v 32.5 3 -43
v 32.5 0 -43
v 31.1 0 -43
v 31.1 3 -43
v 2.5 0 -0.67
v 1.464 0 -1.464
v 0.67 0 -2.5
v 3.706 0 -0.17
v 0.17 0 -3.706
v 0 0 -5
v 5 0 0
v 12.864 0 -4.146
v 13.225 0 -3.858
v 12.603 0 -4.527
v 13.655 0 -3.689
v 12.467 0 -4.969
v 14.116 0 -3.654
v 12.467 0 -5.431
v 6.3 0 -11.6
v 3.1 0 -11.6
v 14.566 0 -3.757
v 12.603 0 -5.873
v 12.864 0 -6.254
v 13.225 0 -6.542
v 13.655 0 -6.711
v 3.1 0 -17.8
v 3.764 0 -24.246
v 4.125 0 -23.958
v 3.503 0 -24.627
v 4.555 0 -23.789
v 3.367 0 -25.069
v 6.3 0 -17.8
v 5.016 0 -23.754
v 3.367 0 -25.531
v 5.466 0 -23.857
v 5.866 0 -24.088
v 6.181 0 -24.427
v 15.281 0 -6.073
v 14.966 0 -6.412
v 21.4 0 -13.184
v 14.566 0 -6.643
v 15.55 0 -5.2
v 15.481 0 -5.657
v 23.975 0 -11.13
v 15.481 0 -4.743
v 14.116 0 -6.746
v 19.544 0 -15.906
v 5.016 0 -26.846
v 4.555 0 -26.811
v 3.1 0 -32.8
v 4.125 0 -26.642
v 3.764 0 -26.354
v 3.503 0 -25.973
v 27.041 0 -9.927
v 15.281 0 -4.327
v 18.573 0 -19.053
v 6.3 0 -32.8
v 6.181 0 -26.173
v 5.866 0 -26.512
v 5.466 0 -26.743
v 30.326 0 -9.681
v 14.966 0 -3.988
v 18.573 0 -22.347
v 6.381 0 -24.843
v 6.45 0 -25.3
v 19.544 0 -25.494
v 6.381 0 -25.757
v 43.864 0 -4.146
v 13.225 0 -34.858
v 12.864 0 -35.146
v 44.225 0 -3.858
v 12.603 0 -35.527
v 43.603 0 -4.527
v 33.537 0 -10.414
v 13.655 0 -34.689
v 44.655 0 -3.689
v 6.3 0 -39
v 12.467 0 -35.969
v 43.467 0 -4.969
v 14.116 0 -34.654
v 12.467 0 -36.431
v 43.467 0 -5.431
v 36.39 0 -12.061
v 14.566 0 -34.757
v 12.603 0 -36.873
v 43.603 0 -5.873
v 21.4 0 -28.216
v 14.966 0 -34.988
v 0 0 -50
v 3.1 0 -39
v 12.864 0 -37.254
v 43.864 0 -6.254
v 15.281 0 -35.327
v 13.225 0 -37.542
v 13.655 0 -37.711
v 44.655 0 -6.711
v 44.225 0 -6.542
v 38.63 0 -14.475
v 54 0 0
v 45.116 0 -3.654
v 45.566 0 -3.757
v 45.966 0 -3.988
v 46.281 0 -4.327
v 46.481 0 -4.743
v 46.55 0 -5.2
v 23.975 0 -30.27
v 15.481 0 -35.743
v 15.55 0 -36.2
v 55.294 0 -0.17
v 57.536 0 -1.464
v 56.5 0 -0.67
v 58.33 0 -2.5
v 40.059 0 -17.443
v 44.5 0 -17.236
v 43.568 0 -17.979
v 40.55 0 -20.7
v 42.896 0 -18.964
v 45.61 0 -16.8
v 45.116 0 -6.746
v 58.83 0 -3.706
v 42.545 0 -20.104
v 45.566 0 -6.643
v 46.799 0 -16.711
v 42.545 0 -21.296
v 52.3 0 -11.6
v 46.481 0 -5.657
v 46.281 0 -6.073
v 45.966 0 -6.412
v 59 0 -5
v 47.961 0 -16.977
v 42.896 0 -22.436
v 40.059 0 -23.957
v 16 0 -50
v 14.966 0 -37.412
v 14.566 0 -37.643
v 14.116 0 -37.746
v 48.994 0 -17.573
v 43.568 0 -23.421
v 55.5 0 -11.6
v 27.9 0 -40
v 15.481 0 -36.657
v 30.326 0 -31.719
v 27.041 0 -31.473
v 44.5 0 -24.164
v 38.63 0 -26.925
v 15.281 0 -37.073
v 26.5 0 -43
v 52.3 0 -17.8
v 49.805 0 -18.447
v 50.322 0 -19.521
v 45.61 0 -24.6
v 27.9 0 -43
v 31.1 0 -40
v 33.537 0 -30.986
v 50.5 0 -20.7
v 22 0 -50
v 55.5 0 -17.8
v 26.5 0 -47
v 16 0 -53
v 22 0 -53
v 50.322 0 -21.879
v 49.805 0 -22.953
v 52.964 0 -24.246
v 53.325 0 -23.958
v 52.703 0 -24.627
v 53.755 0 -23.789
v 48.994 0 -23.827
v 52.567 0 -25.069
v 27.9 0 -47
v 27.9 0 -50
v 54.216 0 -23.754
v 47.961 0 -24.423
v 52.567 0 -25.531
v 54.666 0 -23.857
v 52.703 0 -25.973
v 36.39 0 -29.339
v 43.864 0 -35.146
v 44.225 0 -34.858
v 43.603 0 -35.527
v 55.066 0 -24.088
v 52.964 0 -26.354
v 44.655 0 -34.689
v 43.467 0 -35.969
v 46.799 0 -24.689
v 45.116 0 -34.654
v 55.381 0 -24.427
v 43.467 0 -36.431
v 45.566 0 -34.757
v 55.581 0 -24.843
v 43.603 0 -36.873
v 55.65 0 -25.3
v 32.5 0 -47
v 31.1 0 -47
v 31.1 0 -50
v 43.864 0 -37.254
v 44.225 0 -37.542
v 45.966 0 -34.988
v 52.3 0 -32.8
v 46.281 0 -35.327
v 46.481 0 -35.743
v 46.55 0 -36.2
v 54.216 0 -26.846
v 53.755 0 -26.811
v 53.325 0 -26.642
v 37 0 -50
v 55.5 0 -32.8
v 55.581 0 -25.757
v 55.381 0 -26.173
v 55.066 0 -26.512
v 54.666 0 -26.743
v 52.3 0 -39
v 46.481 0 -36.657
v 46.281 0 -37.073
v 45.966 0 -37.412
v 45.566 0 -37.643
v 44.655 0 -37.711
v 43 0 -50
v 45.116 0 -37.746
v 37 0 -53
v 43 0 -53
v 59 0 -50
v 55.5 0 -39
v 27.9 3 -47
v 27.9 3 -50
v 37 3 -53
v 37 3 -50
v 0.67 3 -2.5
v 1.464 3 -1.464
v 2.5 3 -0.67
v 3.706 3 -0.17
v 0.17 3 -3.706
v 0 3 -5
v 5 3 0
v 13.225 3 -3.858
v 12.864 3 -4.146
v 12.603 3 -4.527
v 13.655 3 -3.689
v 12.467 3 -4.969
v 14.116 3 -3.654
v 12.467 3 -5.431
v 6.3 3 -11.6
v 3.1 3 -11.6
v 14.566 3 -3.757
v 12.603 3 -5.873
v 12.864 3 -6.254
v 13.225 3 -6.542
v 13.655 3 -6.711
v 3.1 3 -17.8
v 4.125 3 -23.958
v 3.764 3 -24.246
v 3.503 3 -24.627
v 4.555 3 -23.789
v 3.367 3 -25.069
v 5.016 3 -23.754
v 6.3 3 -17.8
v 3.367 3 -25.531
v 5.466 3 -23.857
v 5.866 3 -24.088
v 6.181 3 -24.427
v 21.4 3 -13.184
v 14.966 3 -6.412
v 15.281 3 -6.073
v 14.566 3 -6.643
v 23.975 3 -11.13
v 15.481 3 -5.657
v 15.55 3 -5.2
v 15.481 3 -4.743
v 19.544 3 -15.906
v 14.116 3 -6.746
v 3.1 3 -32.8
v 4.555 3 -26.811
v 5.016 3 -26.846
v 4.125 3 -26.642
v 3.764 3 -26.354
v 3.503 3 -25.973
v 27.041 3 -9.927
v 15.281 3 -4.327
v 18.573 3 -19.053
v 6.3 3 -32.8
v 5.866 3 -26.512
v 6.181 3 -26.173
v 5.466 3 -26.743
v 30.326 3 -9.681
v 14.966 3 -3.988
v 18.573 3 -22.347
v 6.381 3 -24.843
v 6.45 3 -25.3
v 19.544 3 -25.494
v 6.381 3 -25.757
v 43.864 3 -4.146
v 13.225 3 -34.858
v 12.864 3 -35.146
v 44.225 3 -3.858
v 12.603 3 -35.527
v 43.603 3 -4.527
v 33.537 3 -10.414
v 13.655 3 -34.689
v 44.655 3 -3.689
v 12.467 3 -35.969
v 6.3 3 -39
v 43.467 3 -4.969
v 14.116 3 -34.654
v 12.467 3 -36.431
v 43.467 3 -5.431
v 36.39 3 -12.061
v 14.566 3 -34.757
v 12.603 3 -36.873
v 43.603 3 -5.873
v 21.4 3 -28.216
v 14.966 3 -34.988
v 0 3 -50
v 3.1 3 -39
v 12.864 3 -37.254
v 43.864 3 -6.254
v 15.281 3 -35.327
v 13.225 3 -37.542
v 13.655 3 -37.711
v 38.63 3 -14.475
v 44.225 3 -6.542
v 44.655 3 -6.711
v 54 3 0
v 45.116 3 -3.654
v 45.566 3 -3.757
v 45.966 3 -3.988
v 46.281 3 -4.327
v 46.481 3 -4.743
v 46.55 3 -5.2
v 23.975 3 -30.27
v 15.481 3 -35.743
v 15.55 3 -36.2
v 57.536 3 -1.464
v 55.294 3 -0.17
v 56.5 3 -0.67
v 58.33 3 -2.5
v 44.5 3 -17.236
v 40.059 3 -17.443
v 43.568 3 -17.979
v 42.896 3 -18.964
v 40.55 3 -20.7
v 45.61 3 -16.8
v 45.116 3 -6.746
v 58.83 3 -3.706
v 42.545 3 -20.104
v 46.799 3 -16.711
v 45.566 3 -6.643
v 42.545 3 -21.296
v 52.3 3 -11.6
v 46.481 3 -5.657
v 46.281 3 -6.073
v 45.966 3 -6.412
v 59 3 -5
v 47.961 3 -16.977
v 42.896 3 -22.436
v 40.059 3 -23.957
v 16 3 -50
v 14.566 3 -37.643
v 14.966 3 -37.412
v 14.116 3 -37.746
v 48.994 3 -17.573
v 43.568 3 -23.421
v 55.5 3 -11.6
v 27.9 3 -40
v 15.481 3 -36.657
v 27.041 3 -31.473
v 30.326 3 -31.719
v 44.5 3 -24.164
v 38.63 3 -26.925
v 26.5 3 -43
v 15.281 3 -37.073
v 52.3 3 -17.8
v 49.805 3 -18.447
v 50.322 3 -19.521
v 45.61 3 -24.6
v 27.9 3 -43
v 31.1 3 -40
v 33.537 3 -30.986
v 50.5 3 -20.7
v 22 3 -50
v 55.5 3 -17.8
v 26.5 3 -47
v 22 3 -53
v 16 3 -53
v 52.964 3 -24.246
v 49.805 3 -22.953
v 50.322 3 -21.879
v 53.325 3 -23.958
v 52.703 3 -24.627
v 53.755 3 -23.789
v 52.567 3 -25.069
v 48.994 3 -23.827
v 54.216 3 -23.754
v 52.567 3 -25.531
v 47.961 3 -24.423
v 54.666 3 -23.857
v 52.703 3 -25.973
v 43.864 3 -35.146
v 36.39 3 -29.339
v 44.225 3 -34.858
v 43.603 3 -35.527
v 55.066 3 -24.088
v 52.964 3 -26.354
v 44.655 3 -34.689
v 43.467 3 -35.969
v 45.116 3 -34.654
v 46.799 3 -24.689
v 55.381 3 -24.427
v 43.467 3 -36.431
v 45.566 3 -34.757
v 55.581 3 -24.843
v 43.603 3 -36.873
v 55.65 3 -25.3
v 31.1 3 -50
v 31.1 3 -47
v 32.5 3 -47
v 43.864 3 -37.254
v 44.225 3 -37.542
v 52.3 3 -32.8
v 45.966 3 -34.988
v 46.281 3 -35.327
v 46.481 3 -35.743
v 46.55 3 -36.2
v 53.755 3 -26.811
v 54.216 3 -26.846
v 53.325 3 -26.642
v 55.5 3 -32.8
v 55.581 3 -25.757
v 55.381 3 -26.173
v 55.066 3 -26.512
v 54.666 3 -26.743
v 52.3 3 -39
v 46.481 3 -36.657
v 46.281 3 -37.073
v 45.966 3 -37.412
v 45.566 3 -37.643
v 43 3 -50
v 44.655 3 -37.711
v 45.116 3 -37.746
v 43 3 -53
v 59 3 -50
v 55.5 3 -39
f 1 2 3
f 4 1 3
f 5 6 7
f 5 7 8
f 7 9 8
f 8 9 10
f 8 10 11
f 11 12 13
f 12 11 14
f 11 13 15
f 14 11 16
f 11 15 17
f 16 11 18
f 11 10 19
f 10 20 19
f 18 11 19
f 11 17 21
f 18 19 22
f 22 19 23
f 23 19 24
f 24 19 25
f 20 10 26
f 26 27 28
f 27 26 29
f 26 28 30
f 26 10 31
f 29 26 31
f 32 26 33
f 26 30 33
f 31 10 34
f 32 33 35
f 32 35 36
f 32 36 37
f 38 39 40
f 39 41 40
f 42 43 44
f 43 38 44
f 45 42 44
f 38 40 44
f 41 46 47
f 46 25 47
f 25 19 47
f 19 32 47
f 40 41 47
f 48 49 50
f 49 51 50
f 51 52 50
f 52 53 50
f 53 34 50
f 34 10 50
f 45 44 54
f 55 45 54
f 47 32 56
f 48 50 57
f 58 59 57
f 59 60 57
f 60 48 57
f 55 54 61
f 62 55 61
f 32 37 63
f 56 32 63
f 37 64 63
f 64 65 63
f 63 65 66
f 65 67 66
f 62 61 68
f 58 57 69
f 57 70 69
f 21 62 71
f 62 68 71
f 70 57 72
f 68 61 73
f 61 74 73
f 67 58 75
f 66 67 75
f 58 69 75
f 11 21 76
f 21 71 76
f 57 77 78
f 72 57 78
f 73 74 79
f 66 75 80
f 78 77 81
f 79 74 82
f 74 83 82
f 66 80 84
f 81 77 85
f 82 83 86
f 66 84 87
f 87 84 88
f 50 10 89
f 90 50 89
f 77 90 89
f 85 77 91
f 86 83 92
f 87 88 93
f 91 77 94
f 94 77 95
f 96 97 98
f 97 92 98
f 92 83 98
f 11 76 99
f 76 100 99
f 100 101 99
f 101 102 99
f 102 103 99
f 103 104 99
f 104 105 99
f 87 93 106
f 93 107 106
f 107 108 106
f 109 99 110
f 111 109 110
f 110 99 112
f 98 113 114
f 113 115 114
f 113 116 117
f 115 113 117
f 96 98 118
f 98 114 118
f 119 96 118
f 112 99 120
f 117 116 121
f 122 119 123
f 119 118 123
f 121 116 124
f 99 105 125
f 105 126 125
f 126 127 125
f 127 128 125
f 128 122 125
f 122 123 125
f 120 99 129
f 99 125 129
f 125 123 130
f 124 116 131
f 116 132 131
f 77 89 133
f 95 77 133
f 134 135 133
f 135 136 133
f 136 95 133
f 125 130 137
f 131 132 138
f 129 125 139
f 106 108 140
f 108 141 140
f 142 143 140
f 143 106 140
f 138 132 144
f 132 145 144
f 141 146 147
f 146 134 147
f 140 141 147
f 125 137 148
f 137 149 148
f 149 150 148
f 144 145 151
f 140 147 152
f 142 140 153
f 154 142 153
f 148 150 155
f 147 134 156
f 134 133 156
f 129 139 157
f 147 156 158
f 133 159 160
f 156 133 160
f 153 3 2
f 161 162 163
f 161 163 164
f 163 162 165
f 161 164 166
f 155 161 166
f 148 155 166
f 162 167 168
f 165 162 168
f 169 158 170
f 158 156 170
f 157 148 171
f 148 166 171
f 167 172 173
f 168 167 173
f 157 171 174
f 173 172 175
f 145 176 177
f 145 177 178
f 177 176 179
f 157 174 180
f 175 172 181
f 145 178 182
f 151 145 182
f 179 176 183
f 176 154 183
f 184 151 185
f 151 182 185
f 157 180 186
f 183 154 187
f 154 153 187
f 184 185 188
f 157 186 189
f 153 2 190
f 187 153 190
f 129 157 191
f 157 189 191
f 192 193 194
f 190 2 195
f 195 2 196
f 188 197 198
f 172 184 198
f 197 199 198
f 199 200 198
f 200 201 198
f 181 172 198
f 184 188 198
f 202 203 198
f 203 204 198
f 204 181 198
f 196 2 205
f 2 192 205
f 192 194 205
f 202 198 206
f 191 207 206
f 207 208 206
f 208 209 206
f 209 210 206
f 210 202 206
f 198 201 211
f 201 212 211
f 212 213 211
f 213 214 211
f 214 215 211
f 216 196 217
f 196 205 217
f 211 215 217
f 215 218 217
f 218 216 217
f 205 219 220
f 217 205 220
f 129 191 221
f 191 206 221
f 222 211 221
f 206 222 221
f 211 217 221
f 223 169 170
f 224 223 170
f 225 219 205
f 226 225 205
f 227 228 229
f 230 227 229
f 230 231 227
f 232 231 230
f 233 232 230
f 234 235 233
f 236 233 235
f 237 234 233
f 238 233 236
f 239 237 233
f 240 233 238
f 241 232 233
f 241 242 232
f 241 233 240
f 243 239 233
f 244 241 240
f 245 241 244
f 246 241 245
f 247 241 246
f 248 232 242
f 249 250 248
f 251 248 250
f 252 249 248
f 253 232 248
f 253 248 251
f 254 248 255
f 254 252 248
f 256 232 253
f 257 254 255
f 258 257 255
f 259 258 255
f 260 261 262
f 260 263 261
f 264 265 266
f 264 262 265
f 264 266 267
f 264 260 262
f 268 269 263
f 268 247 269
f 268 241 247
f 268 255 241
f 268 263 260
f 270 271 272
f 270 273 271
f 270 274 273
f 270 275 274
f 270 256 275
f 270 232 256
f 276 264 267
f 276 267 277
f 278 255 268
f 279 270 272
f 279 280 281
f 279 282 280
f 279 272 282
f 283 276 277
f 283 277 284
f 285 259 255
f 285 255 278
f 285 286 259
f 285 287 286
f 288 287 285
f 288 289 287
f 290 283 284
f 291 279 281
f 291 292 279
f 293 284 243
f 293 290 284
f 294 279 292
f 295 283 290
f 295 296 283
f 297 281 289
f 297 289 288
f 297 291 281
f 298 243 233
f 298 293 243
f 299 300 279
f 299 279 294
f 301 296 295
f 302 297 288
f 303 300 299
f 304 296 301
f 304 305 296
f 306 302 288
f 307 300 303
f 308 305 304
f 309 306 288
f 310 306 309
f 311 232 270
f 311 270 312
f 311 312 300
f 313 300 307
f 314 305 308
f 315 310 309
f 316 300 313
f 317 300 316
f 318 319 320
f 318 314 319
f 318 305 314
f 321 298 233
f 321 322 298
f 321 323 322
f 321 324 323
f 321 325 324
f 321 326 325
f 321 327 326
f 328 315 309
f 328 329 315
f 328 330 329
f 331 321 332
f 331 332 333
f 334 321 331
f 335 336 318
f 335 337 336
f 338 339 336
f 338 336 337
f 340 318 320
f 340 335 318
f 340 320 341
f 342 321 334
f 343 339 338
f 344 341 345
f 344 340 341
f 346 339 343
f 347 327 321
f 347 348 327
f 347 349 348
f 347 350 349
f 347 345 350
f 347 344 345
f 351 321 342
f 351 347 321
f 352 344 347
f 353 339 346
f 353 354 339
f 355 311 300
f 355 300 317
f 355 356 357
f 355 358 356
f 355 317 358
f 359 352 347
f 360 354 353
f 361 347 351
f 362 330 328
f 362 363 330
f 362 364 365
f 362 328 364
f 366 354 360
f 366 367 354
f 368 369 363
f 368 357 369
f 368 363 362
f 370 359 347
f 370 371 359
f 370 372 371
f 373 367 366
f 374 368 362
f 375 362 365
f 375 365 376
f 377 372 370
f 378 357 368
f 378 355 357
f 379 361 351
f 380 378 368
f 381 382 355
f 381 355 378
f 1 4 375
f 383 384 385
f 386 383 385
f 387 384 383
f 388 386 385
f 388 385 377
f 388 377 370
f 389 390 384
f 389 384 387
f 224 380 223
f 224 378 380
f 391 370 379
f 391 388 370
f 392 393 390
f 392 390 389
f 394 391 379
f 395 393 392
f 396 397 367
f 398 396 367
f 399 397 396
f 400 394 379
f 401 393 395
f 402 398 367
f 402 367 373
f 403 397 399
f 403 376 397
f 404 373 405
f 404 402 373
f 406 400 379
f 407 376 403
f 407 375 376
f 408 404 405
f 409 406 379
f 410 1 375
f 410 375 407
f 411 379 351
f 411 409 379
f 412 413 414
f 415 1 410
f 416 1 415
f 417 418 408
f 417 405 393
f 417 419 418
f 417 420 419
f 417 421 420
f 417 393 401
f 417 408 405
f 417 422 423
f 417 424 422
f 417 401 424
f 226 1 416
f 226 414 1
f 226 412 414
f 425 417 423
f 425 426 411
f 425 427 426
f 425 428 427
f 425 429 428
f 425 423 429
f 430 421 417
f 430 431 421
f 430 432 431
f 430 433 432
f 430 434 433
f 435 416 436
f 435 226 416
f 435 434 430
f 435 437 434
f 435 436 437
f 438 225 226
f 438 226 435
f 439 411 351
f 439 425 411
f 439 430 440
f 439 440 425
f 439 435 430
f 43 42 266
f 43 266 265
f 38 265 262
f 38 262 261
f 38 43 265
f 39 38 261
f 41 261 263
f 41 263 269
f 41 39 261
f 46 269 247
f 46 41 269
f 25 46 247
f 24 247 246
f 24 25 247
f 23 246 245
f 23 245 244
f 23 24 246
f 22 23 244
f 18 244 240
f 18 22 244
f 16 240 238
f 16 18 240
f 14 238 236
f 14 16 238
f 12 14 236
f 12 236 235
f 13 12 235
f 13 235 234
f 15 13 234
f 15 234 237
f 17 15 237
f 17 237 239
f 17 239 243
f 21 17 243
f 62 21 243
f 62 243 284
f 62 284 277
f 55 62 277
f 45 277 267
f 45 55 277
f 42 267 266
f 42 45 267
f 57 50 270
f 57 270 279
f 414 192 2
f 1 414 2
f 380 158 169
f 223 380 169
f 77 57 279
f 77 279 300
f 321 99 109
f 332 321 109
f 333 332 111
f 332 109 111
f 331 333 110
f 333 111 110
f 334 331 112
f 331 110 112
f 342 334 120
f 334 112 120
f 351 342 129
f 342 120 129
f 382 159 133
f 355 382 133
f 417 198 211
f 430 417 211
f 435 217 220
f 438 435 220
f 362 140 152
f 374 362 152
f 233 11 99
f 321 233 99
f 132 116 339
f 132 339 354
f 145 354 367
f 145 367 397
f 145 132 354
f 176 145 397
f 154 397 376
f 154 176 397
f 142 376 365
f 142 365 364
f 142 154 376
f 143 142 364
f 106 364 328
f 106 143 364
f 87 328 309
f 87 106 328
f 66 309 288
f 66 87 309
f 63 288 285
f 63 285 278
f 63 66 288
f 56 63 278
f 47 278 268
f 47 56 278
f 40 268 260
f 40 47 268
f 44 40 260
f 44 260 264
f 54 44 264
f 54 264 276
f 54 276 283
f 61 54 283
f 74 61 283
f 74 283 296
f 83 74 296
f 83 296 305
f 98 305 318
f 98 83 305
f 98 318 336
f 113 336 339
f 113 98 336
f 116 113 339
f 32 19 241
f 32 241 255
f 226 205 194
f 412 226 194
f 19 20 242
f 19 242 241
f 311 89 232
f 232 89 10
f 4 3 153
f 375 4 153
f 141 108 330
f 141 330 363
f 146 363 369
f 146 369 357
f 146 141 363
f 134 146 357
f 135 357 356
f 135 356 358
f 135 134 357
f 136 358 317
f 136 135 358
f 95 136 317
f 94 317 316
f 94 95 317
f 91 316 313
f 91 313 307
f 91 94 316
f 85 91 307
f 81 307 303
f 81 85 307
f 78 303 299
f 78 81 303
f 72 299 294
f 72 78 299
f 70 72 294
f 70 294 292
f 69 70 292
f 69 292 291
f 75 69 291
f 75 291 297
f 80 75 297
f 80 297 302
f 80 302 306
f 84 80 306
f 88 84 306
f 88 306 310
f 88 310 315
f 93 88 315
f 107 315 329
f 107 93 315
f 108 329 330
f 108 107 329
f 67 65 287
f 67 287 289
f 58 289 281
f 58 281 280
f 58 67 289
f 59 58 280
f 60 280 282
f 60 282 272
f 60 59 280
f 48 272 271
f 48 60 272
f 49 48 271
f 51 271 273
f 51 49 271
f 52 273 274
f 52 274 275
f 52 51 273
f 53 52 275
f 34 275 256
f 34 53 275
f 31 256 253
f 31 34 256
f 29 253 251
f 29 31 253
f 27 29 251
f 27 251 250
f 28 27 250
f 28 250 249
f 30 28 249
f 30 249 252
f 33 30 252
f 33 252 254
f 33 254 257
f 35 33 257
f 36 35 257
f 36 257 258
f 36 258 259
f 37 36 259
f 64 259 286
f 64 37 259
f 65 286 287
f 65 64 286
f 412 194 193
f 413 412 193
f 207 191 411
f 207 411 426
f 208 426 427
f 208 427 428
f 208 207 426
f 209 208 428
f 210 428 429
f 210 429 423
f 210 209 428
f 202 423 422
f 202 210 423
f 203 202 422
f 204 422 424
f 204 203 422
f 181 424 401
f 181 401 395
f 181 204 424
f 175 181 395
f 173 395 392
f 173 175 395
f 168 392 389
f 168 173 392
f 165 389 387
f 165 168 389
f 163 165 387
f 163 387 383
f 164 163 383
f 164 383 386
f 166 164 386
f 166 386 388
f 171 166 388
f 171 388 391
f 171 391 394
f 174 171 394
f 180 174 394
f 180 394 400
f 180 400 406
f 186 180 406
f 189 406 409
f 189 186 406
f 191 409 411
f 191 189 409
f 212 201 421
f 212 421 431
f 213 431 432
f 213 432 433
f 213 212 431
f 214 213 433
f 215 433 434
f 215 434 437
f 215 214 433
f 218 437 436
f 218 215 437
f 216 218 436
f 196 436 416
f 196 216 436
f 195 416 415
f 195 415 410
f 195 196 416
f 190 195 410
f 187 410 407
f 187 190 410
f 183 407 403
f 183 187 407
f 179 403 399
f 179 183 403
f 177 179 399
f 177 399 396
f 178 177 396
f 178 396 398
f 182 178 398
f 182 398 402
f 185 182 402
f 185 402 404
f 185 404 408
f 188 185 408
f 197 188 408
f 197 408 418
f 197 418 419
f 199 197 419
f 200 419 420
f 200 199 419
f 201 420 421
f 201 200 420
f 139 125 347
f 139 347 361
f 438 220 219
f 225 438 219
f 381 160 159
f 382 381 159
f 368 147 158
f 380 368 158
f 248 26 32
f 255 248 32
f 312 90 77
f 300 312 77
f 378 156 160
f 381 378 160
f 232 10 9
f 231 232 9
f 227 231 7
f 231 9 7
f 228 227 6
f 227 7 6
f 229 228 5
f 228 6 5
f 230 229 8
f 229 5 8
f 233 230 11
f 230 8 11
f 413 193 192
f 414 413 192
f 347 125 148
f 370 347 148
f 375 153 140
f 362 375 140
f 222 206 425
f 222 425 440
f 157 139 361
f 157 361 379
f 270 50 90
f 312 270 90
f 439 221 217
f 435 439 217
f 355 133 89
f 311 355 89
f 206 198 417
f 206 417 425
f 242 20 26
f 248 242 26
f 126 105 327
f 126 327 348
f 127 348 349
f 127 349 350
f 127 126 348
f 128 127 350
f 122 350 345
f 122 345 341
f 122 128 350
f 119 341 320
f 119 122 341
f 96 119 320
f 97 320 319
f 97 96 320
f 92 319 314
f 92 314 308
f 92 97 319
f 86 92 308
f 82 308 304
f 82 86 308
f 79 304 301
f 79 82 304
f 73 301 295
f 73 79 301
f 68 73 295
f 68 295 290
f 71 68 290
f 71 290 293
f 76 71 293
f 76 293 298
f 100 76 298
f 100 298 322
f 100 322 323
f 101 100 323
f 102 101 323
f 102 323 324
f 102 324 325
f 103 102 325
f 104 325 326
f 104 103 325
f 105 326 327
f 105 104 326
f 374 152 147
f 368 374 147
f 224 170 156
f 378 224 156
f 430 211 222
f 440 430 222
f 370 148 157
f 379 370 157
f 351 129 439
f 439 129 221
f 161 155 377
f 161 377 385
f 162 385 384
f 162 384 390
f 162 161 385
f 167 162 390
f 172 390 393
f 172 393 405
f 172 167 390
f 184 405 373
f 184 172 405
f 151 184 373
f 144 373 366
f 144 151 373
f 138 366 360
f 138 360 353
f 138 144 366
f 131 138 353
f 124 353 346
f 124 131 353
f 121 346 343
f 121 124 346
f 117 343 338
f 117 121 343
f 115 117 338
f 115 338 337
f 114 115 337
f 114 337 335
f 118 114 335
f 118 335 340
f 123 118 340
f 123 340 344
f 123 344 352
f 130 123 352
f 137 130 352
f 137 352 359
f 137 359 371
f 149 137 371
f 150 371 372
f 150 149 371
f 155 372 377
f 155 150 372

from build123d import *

# Parameters (mm, degrees)
CROQUIS1_R              = 1.55
CROQUIS1_R_2            = 11.05
CROQUIS1_R_3            = 4
CROQUIS1_W              = 3.2
CROQUIS1_H              = 6.2
SALIENTE_EXTRUIR1_DEPTH = 3


with BuildPart() as part:
    # Croquis1 → Saliente-Extruir1 (new body)
    with BuildSketch(Plane(origin=(0, 0, 0), x_dir=(1, 0, 0), z_dir=(0, 1, 0))):
        with BuildLine():
            Line((5, 0), (54, 0))
            ThreePointArc((54, 0), (57.535533906, 1.464466094), (59, 5))
            Line((59, 5), (59, 50))
            Line((59, 50), (43, 50))
            Line((43, 50), (43, 53))
            Line((43, 53), (37, 53))
            Line((37, 53), (37, 50))
            Line((37, 50), (31.1, 50))
            Line((31.1, 50), (31.1, 47))
            Line((31.1, 47), (32.5, 47))
            Line((32.5, 47), (32.5, 43))
            Line((32.5, 43), (31.1, 43))
            Line((31.1, 43), (31.1, 40))
            Line((31.1, 40), (27.9, 40))
            Line((27.9, 40), (27.9, 43))
            Line((27.9, 43), (26.5, 43))
            Line((26.5, 43), (26.5, 47))
            Line((26.5, 47), (27.9, 47))
            Line((27.9, 47), (27.9, 50))
            Line((27.9, 50), (22, 50))
            Line((22, 50), (22, 53))
            Line((22, 53), (16, 53))
            Line((16, 53), (16, 50))
            Line((16, 50), (0, 50))
            Line((0, 50), (0, 5))
            ThreePointArc((0, 5), (1.464466094, 1.464466094), (5, 0))
        make_face()
        with Locations((4.9, 25.3)):
            Circle(CROQUIS1_R, mode=Mode.SUBTRACT)
        with Locations((29.5, 20.7)):
            Circle(CROQUIS1_R_2, mode=Mode.SUBTRACT)
        with Locations((14, 36.2)):
            Circle(CROQUIS1_R, mode=Mode.SUBTRACT)
        with Locations((45, 36.2)):
            Circle(CROQUIS1_R, mode=Mode.SUBTRACT)
        with Locations((45, 5.2)):
            Circle(CROQUIS1_R, mode=Mode.SUBTRACT)
        with Locations((14, 5.2)):
            Circle(CROQUIS1_R, mode=Mode.SUBTRACT)
        with Locations((46.5, 20.7)):
            Circle(CROQUIS1_R_3, mode=Mode.SUBTRACT)
        with Locations((54.1, 25.3)):
            Circle(CROQUIS1_R, mode=Mode.SUBTRACT)
        with Locations((4.7, 14.7)):
            Rectangle(CROQUIS1_W, CROQUIS1_H, mode=Mode.SUBTRACT)
        with Locations((4.7, 35.9)):
            Rectangle(CROQUIS1_W, CROQUIS1_H, mode=Mode.SUBTRACT)
        with Locations((53.9, 35.9)):
            Rectangle(CROQUIS1_W, CROQUIS1_H, mode=Mode.SUBTRACT)
        with Locations((53.9, 14.7)):
            Rectangle(CROQUIS1_W, CROQUIS1_H, mode=Mode.SUBTRACT)
    extrude(amount=SALIENTE_EXTRUIR1_DEPTH)


solid = part.part
